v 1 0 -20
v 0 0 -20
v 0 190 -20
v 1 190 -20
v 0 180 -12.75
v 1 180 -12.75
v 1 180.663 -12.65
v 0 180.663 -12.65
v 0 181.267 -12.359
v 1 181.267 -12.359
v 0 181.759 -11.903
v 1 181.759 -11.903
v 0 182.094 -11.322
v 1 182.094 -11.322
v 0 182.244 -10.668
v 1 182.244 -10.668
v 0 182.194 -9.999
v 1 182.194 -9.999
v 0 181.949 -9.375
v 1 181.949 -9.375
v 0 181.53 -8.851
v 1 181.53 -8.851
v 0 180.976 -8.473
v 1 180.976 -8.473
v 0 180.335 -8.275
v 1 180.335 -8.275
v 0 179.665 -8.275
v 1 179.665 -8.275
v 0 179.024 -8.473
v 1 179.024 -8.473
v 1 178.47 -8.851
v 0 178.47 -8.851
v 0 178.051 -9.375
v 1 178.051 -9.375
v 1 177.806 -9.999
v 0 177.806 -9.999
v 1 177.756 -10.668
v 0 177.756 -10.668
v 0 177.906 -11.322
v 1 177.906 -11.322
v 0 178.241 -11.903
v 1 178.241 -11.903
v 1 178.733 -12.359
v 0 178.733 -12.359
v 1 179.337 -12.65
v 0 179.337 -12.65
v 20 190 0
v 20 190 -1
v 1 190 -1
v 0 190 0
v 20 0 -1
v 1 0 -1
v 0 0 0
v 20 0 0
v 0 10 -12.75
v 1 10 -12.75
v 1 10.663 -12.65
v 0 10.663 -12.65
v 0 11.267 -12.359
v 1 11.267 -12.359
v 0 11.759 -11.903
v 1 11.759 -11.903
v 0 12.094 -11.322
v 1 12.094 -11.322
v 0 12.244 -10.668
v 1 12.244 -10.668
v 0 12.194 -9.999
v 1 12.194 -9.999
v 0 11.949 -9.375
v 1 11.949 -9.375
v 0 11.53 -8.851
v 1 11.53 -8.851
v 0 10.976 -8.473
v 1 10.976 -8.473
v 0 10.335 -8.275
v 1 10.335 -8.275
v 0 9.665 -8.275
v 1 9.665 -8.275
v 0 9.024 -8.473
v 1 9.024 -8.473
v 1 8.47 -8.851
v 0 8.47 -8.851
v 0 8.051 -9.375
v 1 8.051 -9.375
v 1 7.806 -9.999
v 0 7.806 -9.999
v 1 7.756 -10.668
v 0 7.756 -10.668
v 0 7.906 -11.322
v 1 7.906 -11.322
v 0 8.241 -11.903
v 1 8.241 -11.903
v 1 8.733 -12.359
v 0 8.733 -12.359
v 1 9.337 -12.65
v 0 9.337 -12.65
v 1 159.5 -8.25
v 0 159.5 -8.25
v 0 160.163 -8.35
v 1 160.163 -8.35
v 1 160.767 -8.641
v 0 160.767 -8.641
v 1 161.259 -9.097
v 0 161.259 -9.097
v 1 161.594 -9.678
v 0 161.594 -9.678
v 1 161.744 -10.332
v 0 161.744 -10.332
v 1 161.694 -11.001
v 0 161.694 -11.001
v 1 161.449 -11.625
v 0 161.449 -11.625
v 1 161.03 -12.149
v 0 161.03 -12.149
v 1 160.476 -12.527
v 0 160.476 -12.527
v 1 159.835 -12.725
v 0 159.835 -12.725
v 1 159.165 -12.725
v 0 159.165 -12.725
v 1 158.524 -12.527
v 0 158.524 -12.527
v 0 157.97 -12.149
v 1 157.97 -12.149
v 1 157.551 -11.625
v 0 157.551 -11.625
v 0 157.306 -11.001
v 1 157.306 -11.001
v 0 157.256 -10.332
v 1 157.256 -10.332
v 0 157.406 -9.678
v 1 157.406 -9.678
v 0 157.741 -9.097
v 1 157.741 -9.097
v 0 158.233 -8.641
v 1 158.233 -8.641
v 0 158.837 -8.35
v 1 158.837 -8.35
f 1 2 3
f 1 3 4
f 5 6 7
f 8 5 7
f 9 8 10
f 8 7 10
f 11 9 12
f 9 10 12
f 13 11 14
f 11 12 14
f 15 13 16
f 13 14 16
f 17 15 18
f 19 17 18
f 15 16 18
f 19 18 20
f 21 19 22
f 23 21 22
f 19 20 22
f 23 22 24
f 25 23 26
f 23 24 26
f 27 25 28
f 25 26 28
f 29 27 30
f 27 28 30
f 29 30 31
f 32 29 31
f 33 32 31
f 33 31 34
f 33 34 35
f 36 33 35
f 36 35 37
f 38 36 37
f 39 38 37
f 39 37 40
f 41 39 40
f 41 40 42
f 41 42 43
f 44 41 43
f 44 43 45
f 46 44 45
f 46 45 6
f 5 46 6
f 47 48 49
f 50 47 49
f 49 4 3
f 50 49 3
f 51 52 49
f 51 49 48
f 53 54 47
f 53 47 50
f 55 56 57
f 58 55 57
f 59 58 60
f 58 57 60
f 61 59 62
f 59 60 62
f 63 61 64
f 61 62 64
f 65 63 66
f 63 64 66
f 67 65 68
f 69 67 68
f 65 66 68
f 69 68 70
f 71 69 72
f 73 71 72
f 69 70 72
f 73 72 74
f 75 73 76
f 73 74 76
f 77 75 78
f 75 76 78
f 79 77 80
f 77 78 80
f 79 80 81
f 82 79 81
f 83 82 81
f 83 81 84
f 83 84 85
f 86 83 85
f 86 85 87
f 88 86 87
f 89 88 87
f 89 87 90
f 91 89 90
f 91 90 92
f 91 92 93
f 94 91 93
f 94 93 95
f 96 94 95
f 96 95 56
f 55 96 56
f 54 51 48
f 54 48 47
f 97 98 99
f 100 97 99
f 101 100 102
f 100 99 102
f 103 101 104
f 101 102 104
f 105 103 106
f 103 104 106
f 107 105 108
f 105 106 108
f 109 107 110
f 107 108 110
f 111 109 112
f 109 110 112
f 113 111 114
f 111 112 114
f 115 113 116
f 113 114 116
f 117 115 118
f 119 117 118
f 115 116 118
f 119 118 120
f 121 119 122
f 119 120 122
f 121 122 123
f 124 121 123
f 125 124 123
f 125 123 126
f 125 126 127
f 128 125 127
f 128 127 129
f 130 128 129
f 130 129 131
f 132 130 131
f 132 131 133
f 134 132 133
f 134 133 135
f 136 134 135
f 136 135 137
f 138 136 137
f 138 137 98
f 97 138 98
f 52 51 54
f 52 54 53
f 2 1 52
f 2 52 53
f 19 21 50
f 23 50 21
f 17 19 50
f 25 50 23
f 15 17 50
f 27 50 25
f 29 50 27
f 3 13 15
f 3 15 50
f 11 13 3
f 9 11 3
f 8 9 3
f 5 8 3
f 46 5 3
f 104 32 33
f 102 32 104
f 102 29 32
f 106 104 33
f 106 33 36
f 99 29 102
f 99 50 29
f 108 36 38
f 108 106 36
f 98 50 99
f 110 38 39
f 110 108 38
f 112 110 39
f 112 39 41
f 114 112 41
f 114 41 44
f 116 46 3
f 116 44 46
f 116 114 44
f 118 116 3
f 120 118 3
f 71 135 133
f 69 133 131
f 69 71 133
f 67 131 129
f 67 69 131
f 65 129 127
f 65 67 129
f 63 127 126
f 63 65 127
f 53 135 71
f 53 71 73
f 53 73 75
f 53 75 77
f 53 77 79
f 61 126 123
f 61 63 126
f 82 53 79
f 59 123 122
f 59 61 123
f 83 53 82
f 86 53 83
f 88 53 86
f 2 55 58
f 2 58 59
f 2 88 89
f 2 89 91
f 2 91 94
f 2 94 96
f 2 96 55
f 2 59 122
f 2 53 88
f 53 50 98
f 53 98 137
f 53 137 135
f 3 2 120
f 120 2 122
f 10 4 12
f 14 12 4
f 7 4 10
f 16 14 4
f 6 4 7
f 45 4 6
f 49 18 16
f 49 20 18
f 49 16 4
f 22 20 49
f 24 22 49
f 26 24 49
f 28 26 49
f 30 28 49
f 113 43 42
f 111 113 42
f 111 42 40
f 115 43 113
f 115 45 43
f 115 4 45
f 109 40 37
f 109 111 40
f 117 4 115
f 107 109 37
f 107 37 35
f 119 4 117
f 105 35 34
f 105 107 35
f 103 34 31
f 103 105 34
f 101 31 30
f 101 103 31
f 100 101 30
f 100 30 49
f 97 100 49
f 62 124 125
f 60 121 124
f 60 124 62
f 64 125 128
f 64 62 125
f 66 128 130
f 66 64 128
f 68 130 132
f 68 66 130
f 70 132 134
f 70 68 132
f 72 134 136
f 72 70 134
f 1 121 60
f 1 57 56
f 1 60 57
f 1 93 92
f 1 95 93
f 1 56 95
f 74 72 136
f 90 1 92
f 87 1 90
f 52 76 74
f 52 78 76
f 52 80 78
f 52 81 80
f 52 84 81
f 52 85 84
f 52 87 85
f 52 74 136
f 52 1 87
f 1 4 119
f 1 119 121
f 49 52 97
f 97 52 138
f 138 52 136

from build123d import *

# Parameters (mm, degrees)
EXTRUDE_1_DEPTH     = 190
SKETCH_2_R          = 2.25
CUT_EXTRUDE_1_DEPTH = 2
SKETCH_3_R          = 2.25
CUT_EXTRUDE_2_DEPTH = 21


with BuildPart() as part:
    # Эскиз1 → Бобышка-Вытянуть1 (new body)
    with BuildSketch(Plane(origin=(0, 0, 0), x_dir=(1, 0, 0), z_dir=(0, 1, 0))):
        Polygon((0, 0), (0, 20), (1, 20), (1, 1), (20, 1), (20, 0), align=None)
    extrude(amount=EXTRUDE_1_DEPTH)

    # Эскиз2 → Вырез-Вытянуть1 (cut, through all)
    with BuildSketch(Plane(origin=(1, 0, 0), x_dir=(0, 0, -1), z_dir=(1, 0, 0))):
        with Locations((10.5, 10)):
            Circle(SKETCH_2_R)
        with Locations((10.5, 180)):
            Circle(SKETCH_2_R)
    extrude(amount=-CUT_EXTRUDE_1_DEPTH, mode=Mode.SUBTRACT)

    # Эскиз3 → Вырез-Вытянуть2 (cut, through all)
    with BuildSketch(Plane.ZY):
        with Locations((-10.5, 159.5)):
            Circle(SKETCH_3_R)
    extrude(amount=-CUT_EXTRUDE_2_DEPTH, mode=Mode.SUBTRACT)


solid = part.part
